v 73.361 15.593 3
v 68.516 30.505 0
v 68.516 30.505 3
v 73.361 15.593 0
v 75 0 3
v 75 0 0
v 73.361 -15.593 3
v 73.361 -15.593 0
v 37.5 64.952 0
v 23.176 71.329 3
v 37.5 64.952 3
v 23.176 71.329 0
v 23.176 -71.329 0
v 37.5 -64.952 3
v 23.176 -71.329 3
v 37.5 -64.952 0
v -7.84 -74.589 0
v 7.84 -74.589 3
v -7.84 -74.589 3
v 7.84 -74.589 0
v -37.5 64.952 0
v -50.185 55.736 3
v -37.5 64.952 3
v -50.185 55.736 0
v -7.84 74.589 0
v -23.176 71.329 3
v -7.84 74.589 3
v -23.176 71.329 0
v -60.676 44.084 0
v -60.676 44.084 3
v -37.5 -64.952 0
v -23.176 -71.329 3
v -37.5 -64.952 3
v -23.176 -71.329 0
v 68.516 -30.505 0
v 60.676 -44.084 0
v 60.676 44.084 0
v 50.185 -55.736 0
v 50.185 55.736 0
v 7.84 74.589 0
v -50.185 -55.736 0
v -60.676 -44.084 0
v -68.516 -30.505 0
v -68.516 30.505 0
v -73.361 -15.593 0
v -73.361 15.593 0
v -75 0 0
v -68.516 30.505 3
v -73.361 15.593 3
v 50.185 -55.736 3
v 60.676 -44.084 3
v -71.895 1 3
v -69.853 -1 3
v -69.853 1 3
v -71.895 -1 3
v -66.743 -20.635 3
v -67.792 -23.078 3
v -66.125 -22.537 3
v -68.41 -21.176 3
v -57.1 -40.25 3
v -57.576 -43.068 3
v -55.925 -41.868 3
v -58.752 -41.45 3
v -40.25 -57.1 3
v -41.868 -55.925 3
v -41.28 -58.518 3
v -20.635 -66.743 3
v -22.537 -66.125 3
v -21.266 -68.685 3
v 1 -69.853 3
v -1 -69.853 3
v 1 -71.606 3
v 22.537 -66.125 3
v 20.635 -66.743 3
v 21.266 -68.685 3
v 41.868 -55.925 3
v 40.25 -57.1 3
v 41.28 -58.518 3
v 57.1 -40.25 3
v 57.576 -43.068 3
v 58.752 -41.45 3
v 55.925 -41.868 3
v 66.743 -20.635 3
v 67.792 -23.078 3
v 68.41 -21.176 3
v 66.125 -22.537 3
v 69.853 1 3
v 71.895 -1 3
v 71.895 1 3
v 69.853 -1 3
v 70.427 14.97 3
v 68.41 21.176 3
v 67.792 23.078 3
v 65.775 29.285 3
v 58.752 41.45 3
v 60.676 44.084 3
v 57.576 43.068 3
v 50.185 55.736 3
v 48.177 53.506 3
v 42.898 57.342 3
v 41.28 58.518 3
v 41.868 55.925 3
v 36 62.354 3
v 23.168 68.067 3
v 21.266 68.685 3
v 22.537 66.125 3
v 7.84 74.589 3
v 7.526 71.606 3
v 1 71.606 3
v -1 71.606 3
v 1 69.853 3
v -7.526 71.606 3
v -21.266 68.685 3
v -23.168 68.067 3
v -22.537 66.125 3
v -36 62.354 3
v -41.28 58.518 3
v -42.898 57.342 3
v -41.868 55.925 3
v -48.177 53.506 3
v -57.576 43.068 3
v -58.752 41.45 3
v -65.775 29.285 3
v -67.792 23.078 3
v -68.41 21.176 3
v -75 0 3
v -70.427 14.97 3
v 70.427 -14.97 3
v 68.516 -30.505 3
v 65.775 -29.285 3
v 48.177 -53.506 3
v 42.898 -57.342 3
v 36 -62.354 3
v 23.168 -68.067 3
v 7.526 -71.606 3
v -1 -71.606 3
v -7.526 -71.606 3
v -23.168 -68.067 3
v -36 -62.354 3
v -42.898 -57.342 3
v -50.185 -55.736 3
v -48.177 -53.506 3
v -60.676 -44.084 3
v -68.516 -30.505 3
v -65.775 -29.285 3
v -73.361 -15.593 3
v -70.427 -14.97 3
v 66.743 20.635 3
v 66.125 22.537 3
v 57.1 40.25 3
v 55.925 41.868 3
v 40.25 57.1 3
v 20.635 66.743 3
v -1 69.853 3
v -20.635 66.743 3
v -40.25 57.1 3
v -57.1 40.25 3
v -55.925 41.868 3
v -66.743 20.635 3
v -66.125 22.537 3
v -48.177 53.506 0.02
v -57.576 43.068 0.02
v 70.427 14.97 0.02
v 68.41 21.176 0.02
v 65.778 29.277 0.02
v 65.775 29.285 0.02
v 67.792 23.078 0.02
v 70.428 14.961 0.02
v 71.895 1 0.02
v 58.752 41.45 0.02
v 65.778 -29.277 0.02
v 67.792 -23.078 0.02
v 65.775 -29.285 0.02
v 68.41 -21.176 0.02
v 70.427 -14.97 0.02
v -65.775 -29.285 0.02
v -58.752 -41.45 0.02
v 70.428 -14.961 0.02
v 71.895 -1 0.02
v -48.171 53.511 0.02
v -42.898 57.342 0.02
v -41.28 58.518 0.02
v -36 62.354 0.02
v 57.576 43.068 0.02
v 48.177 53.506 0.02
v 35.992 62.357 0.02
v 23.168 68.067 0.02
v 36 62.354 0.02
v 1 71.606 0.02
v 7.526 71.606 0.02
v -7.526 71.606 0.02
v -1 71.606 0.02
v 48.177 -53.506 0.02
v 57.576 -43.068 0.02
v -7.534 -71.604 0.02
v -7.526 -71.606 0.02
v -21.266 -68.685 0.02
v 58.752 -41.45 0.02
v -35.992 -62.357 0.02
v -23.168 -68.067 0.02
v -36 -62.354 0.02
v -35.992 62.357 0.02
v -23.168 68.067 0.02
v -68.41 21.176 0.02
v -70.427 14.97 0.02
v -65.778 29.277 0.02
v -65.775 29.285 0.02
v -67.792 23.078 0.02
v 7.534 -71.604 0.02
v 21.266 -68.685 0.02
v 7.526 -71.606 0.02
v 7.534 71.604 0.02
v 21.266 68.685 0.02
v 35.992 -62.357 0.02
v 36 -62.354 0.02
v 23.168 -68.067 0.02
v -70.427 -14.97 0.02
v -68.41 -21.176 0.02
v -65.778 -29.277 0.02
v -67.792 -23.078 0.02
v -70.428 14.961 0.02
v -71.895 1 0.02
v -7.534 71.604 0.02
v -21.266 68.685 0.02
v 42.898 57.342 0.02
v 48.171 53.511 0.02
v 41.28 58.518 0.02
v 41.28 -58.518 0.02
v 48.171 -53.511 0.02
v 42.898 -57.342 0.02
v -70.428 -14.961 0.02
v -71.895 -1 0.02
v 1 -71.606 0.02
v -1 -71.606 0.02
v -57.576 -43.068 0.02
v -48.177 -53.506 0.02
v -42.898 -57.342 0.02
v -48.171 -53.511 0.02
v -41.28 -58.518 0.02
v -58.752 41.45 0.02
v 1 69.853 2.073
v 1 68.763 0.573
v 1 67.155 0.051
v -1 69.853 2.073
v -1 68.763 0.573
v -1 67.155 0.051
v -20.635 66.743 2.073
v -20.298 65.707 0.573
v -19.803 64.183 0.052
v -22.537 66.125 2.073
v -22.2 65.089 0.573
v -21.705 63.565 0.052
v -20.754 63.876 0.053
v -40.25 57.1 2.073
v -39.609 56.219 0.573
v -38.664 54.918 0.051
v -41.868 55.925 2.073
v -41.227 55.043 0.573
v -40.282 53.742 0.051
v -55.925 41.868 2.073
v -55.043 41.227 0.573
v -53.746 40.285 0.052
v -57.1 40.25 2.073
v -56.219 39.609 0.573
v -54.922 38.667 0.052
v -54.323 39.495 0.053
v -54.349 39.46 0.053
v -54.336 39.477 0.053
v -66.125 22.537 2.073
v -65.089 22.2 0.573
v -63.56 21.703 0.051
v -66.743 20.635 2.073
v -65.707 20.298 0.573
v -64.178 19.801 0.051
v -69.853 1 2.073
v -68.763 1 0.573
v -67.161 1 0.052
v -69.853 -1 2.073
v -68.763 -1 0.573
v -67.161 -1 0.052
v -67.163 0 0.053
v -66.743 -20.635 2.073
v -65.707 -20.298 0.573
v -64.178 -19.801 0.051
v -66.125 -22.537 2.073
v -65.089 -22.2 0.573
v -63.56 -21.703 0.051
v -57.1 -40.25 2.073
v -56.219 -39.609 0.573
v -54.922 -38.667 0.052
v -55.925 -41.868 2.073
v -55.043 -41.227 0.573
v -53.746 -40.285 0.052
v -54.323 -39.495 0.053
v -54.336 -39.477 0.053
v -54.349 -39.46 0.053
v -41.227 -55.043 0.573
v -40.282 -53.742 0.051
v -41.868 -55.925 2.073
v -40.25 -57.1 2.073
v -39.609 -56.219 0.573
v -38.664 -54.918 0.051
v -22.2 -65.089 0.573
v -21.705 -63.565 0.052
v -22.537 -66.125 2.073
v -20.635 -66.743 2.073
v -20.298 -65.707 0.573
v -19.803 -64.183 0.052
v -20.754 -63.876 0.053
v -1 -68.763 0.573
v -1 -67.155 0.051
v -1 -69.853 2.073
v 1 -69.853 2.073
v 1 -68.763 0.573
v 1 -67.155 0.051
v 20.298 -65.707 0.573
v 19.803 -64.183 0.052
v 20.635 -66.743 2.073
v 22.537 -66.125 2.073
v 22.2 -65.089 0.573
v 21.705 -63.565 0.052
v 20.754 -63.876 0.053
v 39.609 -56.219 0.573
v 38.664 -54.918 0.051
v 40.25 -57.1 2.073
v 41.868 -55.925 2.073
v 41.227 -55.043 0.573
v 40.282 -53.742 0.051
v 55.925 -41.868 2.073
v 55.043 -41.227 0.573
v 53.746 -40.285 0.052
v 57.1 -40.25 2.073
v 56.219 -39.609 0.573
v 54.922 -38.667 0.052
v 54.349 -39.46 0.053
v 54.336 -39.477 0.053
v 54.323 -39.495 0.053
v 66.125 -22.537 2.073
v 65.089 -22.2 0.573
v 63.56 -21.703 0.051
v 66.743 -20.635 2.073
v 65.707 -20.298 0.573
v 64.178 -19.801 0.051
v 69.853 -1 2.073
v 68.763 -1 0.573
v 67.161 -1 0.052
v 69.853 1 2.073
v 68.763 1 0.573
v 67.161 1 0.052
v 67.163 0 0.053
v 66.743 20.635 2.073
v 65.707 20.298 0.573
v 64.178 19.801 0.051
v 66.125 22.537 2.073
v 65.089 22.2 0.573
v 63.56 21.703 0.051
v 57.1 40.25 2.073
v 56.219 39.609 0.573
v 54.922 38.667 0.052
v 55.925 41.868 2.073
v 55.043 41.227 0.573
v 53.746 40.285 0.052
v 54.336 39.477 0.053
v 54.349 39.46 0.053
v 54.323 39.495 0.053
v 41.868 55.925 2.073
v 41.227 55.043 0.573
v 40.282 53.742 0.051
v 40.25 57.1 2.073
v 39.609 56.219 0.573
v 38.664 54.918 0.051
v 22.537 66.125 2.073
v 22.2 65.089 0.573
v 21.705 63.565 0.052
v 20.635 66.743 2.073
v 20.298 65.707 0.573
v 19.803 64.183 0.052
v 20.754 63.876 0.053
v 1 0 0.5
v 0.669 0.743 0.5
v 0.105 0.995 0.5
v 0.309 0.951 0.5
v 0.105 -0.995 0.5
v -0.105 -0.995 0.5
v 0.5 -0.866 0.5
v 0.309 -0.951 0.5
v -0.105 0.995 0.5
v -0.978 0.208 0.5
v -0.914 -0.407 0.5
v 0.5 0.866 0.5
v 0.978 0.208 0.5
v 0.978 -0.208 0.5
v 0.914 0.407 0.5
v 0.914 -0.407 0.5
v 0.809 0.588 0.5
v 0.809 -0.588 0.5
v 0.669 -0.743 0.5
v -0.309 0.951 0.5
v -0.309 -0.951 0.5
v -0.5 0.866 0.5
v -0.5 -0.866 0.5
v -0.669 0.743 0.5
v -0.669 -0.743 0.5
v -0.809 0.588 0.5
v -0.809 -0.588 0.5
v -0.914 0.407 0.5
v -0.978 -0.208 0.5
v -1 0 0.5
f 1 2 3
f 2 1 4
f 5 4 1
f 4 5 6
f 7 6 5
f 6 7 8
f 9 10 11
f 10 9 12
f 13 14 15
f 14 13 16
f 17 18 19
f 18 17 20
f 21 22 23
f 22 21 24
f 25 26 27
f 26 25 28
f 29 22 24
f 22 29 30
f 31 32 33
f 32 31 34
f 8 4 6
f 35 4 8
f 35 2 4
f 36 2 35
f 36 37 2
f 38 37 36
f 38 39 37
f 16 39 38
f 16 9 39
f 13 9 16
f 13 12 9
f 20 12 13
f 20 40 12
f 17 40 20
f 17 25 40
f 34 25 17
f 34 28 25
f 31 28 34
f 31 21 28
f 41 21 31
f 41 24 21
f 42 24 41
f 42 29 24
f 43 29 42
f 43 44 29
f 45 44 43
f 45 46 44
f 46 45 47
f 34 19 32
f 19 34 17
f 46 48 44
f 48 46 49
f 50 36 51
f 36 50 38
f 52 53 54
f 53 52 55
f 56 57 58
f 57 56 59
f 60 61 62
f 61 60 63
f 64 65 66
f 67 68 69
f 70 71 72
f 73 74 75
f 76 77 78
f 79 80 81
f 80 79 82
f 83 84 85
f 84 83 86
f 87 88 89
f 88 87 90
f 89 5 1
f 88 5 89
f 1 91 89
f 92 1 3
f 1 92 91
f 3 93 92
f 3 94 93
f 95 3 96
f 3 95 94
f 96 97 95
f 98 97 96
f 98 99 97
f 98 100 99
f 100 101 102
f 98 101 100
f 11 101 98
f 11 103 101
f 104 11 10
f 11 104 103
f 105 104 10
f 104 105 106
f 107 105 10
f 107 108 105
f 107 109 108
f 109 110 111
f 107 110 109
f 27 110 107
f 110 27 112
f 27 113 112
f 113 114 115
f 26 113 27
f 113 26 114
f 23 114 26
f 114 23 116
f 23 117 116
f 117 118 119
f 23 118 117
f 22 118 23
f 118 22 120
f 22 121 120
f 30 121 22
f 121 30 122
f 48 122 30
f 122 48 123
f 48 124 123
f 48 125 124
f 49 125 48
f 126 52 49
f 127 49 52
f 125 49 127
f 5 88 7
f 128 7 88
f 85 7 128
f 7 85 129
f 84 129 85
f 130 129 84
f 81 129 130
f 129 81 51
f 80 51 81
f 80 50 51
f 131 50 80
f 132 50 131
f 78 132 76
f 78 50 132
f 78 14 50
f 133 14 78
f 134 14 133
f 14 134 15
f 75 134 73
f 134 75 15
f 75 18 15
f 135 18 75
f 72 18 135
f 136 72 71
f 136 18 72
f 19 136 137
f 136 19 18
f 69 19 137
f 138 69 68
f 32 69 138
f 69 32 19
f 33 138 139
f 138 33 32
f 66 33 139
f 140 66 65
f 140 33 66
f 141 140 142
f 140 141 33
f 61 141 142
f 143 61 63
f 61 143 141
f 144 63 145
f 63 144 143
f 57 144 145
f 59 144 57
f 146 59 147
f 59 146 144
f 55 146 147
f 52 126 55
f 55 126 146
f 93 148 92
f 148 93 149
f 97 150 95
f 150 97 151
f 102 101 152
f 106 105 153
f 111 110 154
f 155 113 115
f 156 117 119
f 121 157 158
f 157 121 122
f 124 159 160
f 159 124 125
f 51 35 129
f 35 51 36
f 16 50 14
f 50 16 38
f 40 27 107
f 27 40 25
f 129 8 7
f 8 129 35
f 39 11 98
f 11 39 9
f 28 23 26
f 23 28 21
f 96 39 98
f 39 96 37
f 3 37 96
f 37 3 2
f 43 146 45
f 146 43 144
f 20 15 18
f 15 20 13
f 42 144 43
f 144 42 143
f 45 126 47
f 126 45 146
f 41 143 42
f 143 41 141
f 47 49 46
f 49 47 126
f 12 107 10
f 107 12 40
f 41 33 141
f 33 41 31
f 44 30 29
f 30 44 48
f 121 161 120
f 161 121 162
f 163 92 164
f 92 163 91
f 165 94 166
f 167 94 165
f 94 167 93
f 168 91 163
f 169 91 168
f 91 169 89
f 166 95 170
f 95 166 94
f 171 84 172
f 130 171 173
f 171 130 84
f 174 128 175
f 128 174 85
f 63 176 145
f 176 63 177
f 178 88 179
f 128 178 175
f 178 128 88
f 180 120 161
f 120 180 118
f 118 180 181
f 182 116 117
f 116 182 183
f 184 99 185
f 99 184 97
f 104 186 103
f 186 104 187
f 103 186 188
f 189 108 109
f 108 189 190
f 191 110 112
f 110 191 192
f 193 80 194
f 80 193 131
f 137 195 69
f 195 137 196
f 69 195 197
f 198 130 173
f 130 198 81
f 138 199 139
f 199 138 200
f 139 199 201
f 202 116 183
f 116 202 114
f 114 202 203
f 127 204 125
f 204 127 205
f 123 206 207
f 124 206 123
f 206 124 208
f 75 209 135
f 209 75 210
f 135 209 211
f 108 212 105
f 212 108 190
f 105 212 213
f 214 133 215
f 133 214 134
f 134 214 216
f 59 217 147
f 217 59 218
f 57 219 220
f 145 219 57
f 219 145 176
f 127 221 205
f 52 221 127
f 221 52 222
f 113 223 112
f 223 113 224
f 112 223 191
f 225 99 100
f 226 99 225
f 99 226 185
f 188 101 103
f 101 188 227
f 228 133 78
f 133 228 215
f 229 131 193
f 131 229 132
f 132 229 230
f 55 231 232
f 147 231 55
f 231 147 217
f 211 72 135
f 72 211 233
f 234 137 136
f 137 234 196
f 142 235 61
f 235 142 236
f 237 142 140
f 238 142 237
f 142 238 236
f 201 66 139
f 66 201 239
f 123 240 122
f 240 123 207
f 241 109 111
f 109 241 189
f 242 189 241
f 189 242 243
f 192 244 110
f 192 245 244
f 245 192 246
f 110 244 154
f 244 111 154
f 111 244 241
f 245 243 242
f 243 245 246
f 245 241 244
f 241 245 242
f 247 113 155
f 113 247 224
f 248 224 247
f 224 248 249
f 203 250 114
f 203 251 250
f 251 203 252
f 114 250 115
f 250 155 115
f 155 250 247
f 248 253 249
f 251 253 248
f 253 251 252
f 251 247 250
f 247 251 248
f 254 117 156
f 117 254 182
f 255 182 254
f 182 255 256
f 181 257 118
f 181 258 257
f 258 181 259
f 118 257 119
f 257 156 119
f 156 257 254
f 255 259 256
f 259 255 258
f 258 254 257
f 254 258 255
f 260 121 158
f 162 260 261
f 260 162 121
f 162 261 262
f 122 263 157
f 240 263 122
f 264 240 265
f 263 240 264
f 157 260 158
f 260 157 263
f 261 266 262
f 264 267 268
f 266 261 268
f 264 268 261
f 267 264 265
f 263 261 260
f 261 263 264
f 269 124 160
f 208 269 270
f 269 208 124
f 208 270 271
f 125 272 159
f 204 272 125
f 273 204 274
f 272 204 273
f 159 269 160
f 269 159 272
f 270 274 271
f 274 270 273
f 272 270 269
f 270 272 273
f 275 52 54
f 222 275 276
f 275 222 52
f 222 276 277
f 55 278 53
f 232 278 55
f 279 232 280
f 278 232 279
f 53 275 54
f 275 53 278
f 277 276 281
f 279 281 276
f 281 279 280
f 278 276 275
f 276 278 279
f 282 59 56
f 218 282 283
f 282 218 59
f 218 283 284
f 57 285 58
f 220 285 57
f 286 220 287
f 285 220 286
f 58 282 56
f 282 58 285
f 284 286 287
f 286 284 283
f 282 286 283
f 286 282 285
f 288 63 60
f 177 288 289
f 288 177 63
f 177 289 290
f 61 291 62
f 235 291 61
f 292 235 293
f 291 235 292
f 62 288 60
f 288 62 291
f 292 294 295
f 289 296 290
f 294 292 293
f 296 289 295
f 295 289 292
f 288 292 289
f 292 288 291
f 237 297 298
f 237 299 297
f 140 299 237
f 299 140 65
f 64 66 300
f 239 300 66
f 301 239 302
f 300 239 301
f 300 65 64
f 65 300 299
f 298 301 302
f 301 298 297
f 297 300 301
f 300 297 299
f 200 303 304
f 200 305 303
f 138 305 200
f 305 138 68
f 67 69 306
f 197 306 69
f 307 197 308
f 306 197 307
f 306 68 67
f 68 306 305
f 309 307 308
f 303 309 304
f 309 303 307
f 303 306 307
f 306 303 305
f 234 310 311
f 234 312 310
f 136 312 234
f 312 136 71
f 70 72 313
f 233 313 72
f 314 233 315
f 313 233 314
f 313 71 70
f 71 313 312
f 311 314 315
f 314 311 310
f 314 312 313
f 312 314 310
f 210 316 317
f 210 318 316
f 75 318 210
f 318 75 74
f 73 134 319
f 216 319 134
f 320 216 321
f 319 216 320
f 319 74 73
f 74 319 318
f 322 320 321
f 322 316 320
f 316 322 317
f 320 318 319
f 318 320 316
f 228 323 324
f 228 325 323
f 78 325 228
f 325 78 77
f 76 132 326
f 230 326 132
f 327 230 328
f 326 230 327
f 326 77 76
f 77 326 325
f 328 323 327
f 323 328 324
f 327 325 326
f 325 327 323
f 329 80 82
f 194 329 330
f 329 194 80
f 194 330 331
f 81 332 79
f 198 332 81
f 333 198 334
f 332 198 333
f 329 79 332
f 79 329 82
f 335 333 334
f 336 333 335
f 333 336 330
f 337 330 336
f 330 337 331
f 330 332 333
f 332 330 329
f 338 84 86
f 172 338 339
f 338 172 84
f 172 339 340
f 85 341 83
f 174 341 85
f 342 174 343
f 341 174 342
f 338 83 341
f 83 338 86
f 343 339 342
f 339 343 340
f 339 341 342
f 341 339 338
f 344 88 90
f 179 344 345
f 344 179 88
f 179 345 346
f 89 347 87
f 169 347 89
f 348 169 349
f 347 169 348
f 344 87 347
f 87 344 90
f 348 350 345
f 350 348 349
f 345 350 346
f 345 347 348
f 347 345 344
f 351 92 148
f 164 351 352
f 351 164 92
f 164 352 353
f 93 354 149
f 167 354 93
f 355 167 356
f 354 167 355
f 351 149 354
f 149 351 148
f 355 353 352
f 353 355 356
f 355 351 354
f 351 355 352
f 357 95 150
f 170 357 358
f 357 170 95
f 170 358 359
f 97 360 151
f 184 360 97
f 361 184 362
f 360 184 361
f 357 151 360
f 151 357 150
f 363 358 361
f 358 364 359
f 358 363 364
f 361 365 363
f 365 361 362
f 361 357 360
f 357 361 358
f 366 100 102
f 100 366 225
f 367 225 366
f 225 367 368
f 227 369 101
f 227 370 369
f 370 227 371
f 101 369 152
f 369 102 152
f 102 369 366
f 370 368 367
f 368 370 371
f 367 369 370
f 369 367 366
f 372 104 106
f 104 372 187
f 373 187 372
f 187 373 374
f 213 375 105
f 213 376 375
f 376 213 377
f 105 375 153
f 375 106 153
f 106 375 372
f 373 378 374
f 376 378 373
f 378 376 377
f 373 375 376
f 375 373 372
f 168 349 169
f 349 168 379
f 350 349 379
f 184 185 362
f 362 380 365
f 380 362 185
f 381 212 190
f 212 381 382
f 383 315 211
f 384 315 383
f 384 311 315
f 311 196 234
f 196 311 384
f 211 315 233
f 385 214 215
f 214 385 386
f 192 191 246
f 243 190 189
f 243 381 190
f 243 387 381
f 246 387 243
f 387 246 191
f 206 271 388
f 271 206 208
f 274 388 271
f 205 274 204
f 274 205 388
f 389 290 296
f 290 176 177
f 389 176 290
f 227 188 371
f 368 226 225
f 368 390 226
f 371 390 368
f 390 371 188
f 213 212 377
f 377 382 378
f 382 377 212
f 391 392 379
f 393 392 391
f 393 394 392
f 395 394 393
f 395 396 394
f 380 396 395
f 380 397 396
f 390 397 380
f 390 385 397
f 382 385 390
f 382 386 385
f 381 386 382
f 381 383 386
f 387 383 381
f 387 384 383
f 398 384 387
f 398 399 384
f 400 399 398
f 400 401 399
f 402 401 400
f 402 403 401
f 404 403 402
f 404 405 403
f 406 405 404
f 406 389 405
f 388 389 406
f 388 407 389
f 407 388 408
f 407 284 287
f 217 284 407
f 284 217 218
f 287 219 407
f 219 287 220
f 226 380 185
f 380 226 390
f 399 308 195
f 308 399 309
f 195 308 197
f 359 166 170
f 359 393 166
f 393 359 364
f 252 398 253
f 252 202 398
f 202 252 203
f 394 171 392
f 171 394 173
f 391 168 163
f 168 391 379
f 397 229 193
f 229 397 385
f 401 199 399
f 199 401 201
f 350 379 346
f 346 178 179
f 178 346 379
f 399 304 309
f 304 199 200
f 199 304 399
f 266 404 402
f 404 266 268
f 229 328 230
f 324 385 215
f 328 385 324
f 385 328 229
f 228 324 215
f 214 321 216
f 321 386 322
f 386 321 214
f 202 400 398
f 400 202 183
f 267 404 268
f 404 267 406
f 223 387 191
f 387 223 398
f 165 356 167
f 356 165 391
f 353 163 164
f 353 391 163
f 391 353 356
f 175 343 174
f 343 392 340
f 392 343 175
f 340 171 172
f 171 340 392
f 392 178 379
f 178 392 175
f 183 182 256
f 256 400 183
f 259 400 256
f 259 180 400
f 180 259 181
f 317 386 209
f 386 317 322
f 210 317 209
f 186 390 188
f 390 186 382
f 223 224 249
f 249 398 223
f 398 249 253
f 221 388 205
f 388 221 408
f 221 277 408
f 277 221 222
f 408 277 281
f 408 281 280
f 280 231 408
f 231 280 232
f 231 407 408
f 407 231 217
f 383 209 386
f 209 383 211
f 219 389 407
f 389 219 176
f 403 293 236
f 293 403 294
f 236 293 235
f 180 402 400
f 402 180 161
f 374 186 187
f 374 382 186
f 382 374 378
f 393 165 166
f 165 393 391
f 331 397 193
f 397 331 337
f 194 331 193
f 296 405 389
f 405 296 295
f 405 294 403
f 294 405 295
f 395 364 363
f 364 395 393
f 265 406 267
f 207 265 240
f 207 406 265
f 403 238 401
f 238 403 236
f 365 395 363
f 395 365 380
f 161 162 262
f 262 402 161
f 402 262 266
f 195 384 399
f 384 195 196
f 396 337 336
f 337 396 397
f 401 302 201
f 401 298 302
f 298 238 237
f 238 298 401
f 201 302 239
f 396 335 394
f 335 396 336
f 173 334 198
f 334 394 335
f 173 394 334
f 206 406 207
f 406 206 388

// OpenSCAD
target_radius = 75;
membrane_height = .5;
frame_height = 3;
frame_width = 3;
reinforcement_length = 5;
reinforcement_width = 2;
reinforcement_count = 20;
reinforcement_repeat_angle = 360 / reinforcement_count;



difference () {
    cylinder (frame_height, target_radius, target_radius);
    cylinder (frame_height, target_radius - frame_width, target_radius - frame_width);
}
cylinder (membrane_height, target_radius);

for (i=[0:reinforcement_count]) {
    rotate (reinforcement_repeat_angle * i) {
        translate ([0, target_radius - frame_width - reinforcement_length / 2, frame_height / 2]) {
            difference() {
                cube([reinforcement_width, reinforcement_length, frame_height], center=true);
                translate ([0, -(reinforcement_length / 2), frame_height / 2]) {
                    rotate ([0,90,0]) {
                        cylinder(reinforcement_width, frame_height, frame_height, center=true);
                    }
                }
            }
        }
    }
}
